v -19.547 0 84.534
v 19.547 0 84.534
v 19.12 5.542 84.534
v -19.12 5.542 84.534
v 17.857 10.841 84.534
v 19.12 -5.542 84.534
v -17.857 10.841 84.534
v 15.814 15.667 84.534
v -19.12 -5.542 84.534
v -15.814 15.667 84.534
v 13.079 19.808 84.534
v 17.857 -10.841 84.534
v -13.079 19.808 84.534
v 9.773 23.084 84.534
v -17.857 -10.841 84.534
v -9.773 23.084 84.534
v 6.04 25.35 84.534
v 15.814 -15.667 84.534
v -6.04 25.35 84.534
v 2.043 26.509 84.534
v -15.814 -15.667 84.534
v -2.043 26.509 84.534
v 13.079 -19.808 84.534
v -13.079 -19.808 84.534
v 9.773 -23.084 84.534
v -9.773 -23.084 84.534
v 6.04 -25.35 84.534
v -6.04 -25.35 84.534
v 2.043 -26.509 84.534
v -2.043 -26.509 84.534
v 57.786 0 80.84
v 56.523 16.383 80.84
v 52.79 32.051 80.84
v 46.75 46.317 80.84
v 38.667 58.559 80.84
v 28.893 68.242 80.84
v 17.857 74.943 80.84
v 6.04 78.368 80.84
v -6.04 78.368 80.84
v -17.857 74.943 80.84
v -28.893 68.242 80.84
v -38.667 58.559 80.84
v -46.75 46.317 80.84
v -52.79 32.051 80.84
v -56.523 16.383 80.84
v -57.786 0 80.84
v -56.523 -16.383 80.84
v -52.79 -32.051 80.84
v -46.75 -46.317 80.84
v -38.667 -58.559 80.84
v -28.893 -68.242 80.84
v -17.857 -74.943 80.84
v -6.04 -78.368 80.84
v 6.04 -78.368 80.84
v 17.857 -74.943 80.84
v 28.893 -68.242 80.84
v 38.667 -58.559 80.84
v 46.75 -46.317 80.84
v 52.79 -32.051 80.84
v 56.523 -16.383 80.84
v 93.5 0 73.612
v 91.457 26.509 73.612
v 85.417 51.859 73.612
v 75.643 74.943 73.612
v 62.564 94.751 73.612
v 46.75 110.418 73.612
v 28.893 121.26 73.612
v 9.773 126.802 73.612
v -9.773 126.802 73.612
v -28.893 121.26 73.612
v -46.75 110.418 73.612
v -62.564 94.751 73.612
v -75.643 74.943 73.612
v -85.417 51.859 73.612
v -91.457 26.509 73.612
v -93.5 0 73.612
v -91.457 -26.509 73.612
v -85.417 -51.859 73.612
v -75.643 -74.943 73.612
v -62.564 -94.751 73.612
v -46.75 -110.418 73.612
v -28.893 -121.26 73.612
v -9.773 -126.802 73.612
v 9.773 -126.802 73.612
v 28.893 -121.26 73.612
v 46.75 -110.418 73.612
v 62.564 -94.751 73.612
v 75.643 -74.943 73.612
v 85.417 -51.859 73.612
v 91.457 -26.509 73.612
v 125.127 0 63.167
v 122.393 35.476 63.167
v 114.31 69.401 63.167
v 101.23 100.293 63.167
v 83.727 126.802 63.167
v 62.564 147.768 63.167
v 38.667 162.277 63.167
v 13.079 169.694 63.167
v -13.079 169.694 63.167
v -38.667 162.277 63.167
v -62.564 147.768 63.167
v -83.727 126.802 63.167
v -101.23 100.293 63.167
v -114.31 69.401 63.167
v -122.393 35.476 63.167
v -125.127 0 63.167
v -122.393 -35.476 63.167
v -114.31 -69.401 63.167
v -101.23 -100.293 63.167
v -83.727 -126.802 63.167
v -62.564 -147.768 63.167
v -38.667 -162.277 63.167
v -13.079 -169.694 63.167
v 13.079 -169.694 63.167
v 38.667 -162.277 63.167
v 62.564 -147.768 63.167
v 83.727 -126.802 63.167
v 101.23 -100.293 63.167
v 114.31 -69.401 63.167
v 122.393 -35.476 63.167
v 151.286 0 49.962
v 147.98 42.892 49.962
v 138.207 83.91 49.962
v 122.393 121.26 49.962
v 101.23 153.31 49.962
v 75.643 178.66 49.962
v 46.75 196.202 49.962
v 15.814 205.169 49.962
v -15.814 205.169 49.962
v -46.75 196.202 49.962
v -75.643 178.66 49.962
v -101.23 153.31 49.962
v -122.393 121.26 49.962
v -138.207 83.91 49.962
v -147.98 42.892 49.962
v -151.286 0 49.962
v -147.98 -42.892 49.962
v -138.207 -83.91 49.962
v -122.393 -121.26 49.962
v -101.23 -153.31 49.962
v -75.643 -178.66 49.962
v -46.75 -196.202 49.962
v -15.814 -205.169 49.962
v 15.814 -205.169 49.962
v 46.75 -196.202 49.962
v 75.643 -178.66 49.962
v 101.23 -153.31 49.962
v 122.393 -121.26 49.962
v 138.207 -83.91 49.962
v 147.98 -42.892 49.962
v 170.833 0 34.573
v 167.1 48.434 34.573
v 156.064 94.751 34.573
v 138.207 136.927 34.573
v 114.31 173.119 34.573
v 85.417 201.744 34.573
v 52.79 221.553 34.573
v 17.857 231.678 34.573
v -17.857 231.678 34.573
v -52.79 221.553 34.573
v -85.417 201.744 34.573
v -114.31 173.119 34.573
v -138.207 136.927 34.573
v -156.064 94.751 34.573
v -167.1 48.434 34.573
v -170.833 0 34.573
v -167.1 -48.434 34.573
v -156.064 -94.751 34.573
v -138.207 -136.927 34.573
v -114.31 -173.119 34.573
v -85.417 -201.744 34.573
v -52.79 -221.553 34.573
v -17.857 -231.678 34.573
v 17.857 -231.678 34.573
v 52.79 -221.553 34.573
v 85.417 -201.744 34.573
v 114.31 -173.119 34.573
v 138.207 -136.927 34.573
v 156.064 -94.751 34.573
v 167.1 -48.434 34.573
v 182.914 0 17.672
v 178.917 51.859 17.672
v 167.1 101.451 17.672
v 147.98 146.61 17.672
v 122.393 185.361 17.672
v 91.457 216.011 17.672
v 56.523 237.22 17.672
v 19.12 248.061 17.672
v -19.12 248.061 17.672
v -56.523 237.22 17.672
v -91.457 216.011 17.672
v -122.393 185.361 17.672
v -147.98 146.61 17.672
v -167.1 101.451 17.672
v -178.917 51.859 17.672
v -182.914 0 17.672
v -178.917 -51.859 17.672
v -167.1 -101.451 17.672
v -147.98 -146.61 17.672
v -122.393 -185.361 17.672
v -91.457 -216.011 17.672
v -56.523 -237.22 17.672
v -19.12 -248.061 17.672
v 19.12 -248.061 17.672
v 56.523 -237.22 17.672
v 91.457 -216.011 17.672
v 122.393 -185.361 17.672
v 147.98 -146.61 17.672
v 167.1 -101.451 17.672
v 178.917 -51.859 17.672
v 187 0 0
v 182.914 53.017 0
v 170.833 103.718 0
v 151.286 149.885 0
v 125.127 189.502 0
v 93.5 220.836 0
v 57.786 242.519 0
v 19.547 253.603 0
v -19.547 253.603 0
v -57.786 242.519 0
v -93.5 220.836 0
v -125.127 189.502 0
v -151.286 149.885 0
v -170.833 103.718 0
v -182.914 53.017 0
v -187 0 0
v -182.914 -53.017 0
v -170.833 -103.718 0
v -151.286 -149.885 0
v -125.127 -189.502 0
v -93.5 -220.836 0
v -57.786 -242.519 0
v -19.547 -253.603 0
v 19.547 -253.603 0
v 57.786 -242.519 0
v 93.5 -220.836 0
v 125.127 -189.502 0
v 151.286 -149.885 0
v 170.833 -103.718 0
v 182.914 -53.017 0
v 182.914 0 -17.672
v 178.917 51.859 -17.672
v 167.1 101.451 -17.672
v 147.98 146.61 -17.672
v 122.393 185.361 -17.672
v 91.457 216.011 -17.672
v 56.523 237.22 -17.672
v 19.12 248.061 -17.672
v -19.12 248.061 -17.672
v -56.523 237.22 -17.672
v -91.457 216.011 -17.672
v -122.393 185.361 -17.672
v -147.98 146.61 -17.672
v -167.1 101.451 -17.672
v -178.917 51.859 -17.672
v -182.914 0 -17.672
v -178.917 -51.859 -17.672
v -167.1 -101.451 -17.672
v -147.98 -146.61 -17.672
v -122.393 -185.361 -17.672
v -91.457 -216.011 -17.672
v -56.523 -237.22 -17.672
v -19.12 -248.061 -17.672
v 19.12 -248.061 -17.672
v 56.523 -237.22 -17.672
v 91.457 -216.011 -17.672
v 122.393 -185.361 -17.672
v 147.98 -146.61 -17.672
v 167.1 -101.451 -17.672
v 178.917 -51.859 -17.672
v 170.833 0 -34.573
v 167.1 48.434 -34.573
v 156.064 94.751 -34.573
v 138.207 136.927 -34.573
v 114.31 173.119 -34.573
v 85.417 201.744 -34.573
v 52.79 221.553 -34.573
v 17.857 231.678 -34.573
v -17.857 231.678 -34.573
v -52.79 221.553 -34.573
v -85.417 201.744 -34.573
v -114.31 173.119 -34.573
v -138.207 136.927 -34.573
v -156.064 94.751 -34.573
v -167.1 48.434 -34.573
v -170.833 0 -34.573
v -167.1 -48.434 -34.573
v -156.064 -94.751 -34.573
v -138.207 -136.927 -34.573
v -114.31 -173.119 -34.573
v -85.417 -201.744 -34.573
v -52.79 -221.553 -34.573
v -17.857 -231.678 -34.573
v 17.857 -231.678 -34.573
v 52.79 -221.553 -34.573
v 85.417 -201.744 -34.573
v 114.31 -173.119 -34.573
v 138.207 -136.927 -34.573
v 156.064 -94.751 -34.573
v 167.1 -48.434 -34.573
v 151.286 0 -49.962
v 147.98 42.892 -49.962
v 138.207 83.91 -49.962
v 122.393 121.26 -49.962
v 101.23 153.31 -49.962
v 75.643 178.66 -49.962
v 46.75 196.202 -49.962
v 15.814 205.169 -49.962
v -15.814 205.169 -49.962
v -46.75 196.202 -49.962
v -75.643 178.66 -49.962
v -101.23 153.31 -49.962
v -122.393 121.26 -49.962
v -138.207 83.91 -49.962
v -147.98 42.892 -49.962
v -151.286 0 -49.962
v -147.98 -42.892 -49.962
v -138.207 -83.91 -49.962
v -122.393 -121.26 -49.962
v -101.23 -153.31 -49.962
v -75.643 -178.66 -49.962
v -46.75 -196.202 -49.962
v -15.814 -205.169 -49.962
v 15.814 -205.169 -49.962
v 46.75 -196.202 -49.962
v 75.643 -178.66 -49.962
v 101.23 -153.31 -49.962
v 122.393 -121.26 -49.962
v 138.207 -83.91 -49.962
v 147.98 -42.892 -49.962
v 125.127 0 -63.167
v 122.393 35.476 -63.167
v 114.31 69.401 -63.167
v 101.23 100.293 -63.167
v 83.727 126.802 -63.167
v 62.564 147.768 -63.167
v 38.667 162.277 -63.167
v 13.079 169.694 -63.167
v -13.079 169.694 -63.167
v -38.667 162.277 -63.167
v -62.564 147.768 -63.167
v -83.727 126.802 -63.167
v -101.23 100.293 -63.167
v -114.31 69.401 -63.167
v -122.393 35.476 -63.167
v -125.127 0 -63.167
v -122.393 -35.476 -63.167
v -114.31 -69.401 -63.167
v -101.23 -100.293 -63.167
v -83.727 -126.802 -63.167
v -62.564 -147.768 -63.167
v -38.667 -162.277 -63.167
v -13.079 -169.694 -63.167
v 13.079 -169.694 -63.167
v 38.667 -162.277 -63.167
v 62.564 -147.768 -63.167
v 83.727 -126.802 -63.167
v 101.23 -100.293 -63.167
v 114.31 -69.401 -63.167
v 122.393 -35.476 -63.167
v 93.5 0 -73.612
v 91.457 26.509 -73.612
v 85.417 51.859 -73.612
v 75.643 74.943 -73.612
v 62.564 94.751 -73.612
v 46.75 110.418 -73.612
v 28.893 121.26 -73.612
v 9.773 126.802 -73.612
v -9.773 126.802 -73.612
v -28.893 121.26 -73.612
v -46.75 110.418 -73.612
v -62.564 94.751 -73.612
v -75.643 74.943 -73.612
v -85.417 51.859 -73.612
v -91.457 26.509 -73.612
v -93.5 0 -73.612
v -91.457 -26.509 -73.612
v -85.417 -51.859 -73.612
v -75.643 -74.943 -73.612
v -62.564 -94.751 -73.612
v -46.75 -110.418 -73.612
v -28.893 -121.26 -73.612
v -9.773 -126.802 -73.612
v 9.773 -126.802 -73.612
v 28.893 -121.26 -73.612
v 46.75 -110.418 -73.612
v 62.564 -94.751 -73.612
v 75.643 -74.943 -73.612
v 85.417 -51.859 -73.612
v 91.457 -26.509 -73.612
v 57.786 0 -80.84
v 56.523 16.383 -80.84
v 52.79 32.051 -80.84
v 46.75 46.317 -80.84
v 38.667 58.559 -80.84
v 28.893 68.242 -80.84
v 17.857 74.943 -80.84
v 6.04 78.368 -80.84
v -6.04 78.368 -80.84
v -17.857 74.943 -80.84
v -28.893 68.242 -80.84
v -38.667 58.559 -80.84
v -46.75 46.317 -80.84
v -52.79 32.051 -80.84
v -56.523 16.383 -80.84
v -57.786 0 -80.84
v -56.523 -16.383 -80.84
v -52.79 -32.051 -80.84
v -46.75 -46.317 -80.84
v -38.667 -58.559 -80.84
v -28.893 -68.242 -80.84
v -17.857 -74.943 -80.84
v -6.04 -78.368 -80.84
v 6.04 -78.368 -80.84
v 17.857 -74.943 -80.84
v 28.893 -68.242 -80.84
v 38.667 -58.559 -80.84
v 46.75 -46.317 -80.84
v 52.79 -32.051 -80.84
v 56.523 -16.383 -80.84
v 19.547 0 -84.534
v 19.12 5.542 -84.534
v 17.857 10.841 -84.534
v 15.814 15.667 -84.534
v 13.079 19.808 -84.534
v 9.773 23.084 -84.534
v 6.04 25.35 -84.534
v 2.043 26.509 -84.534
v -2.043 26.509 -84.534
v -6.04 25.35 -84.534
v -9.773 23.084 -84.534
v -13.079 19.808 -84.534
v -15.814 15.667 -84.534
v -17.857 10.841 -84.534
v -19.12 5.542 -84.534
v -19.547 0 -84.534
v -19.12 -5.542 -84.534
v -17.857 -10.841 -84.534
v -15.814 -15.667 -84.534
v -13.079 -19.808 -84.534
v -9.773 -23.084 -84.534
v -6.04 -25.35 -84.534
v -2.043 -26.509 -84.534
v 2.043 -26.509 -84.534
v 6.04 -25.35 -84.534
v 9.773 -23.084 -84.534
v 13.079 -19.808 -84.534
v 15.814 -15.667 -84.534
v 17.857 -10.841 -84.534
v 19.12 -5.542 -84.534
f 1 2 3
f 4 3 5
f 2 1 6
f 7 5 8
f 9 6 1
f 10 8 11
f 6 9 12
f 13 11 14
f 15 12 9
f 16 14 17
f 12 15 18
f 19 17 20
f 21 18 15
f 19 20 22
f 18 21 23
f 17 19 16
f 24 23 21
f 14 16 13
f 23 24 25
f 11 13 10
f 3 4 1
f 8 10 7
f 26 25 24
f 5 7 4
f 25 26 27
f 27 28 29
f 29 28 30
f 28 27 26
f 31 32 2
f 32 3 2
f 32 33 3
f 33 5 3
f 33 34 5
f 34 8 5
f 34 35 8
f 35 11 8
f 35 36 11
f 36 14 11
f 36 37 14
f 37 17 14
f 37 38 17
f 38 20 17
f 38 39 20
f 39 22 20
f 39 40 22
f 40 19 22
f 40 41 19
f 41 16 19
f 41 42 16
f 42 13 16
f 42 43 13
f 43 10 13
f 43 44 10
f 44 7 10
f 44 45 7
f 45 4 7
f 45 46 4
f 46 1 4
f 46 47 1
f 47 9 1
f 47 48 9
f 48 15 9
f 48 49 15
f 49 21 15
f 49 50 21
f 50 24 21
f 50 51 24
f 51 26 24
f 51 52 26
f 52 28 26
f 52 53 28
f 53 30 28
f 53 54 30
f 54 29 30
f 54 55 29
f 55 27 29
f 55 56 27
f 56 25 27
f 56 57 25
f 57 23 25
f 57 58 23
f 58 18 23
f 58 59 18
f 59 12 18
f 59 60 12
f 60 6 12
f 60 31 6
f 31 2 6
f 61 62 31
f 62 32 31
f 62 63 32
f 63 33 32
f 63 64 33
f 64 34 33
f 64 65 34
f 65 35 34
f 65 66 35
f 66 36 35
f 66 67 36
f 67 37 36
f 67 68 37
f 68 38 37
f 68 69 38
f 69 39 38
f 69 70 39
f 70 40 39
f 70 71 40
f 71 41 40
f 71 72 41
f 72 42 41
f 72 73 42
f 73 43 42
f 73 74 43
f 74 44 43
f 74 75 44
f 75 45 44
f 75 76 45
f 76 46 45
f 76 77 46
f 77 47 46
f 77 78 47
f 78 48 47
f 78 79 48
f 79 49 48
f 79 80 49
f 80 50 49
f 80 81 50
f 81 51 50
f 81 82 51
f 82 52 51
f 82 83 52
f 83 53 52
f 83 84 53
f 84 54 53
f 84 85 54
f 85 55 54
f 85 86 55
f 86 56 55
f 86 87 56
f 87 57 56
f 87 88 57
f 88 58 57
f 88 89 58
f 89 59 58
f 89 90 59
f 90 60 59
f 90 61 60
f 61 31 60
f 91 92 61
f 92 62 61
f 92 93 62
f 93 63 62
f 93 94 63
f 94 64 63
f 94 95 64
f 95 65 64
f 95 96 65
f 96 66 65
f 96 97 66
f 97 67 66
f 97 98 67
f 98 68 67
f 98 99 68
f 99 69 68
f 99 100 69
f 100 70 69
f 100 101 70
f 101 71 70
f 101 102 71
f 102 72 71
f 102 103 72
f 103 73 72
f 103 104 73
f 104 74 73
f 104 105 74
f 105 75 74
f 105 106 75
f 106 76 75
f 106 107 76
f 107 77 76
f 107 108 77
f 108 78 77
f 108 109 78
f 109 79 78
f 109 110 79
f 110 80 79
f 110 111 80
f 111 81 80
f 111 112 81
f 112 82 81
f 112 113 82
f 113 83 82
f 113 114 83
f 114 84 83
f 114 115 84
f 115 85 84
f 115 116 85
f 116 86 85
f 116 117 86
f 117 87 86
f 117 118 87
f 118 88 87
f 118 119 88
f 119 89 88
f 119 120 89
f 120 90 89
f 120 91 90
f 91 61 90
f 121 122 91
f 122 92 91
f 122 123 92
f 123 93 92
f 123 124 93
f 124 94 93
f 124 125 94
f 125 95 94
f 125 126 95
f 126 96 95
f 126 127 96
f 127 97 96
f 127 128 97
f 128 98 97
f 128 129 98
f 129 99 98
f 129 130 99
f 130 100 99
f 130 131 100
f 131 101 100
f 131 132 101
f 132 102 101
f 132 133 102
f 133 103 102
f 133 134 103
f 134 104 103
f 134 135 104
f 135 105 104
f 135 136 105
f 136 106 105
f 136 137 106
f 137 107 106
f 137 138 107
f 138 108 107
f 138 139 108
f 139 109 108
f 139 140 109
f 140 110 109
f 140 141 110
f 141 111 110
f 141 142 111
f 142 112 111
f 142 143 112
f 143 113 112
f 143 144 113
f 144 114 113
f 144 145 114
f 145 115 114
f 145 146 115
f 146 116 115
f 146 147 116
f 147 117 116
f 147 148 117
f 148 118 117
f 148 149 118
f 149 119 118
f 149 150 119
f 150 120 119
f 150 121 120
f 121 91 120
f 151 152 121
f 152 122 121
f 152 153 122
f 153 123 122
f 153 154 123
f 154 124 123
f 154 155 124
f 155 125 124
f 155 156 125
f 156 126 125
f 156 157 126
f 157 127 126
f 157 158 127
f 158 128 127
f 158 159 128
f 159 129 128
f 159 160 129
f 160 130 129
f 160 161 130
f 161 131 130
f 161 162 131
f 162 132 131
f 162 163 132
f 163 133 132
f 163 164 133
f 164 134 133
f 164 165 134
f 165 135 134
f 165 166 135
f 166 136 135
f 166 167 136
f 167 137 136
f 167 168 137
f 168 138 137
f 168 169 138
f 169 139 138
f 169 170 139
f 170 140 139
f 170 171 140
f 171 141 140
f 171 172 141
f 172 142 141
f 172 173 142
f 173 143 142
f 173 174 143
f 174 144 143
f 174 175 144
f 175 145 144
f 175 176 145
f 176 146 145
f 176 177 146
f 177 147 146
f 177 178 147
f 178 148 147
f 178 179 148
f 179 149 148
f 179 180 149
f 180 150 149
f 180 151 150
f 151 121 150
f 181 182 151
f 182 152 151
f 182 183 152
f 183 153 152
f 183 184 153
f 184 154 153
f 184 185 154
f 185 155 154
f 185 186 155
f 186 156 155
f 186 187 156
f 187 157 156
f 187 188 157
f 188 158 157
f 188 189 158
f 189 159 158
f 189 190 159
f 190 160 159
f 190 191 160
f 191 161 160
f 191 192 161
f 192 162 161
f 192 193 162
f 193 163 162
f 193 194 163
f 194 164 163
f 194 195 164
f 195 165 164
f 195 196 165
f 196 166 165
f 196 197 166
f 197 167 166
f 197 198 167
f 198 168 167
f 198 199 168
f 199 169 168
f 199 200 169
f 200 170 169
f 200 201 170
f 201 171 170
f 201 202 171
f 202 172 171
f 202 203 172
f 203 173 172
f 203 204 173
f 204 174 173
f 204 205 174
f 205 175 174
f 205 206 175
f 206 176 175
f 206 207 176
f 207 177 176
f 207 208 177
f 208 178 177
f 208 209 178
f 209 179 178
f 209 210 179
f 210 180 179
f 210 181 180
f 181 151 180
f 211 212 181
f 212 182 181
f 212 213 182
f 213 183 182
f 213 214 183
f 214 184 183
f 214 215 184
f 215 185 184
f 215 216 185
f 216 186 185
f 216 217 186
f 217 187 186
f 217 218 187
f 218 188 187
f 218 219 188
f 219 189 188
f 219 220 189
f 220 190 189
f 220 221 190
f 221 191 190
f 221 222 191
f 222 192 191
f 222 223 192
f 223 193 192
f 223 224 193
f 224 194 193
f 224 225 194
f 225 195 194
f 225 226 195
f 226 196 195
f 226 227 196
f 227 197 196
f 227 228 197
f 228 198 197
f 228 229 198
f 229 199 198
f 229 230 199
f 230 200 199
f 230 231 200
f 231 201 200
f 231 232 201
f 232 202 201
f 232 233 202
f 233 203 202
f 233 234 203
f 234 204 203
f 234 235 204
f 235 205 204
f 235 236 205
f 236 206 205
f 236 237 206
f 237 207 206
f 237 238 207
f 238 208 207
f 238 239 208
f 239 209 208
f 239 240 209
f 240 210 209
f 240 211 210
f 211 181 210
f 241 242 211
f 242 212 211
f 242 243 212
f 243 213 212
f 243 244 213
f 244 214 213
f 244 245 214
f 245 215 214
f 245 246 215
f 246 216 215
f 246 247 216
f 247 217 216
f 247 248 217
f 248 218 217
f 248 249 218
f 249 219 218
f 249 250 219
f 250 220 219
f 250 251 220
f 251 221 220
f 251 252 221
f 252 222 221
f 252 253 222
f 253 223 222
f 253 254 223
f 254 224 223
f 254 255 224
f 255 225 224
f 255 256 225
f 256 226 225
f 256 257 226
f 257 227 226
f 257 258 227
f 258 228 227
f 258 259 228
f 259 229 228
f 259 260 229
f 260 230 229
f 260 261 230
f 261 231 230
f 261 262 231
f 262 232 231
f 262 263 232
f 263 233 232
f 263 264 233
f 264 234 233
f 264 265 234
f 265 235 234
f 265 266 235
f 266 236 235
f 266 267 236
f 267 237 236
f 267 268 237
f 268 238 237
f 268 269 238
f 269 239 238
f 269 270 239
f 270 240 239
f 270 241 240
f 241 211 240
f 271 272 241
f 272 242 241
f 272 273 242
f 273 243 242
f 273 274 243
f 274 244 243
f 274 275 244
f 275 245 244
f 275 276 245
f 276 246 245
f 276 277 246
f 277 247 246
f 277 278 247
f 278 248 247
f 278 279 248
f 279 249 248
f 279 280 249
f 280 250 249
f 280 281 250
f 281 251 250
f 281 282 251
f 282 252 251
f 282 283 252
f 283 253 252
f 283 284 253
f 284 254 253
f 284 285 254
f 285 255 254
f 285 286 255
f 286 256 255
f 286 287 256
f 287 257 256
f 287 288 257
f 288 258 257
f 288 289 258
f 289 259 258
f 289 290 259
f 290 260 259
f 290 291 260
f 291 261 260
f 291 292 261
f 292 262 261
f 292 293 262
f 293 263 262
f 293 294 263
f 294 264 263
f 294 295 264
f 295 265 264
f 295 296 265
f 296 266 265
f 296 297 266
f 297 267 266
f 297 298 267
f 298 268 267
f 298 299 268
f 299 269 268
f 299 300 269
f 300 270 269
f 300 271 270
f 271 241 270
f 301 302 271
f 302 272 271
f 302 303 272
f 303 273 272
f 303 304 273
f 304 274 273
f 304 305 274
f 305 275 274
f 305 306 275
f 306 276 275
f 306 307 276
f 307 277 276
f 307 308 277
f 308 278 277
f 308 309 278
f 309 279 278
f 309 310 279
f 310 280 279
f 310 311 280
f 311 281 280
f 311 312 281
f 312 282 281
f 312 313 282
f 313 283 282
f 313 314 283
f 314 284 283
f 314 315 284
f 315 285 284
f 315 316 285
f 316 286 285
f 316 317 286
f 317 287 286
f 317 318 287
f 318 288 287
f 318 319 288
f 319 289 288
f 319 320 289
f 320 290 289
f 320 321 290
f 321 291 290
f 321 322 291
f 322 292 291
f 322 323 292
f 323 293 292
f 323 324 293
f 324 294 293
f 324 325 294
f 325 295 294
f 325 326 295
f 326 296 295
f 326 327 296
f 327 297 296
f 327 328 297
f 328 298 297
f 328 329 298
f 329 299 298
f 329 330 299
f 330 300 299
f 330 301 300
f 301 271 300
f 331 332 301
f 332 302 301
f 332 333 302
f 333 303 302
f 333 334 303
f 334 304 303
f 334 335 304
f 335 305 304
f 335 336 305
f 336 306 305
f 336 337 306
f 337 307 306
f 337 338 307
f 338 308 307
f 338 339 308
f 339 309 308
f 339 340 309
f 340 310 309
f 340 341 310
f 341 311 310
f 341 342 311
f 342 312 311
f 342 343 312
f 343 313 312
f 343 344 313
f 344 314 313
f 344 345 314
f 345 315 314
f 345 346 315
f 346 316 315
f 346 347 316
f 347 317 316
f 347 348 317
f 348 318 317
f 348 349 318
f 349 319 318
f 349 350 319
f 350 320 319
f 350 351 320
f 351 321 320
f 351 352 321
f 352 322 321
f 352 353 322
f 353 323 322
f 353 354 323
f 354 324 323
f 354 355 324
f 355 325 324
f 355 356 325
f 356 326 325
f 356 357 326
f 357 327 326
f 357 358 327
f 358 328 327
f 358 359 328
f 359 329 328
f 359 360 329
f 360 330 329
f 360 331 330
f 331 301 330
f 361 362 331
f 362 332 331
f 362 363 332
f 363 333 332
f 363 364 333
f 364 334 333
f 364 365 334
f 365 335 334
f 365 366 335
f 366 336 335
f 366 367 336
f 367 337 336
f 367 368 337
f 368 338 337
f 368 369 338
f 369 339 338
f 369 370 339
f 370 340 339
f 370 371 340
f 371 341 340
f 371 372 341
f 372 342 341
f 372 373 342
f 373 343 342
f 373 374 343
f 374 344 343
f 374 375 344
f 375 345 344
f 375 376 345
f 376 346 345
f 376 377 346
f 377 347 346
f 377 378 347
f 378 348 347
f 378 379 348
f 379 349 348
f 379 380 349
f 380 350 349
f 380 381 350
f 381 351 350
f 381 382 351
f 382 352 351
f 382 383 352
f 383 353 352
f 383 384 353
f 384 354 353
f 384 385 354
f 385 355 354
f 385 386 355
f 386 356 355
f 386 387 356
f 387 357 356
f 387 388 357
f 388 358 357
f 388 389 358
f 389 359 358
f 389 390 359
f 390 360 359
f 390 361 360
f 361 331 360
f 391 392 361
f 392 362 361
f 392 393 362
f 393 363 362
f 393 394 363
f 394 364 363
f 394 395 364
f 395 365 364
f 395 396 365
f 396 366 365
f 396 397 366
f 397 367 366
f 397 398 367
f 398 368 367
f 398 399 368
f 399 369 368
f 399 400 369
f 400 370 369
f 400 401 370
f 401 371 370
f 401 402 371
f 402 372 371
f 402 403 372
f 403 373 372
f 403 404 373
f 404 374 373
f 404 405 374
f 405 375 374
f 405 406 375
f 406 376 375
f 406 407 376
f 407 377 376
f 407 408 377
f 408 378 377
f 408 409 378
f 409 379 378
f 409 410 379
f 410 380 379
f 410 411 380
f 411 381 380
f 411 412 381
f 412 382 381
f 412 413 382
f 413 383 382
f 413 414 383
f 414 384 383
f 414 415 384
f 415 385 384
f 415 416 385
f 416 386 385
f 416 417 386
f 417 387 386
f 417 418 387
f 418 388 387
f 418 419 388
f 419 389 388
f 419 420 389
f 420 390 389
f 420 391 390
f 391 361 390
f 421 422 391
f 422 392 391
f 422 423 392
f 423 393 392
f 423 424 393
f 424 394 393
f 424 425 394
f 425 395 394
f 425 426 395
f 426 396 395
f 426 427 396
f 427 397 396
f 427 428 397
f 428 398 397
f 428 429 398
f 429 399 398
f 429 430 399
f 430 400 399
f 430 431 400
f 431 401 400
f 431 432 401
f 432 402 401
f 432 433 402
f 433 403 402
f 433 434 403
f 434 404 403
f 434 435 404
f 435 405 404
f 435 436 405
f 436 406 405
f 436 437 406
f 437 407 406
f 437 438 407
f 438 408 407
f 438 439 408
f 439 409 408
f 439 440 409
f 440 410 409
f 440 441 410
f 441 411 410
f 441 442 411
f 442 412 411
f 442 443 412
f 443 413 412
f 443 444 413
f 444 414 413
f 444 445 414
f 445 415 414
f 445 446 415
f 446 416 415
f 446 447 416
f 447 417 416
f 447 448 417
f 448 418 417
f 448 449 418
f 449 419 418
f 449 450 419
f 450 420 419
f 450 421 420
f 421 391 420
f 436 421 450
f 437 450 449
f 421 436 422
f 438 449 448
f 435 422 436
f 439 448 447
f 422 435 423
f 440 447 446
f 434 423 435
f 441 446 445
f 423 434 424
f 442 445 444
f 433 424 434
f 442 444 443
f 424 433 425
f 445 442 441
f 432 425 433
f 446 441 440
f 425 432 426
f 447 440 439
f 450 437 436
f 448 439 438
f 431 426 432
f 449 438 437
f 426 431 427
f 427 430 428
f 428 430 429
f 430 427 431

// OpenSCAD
// Generated by SolidPython 1.0.1 on 2020-07-29 00:46:50


scale(v = [11, 15, 5]) {
	sphere(r = 17);
}
/***********************************************
*********      SolidPython code:      **********
************************************************
 
# import packages: SolidPython
from solid import *
from solid.utils import *
from itertools import chain, combinations, permutations


class Resize:

    def __init__(self, scad_file):
        self.scad_file = scad_file
        #self.scad_file = import_scad(scad_file)
        # cone/cylinder param:
        self.r1 = 0
        self.r2 = 0
        self.h = 0
        # rectangular prism param:
        self.w = 0
        self.l = 0
        # ellipse param:
        self.r = 0

    # import OpenScad code (file name corresponds to shape)


    # classify shape + parameters
    def assign(self, param1, param2, param3):
        if self.scad_file == 'cone.scad':
            self.r1 = param1
            self.r2 = param2
            self.h = param3
        elif self.scad_file == 'cylinder.scad':
            self.r1 = param1
            self.r2 = param2
            self.h = param3
        elif self.scad_file == 'rectangularPrism.scad':
            self.h = param1
            self.l = param2
            self.w = param3
        else:
            self.r = param1
            self.h = param2

    # resize parameters
    def iterate(self):
        x = range(3, 20, 2)
        i = 1
        if self.scad_file == 'cone.scad':
            tempList = list(permutations(x, 2))
            for temp in tempList:
                param1 = temp[0]
                param2 = temp[1]
                filepath = 'produced_scad_files/' + 'cone' + str(param1) + '_' + str(param2) + '_' + '.scad'
                scad_render_to_file(cylinder(h=param1, r1=param2, r2=0), filepath)

        elif self.scad_file == 'cylinder.scad':
            tempList = list(permutations(x, 3))
            for temp in tempList:
                param1 = temp[0]
                param2 = temp[1]
                filepath = 'produced_scad_files/' + 'cylinder' + str(param1) + '_' + str(param2) + '_' + '.scad'
                scad_render_to_file(cylinder(h=param1, r1=param2, r2=param2), filepath)

        elif self.scad_file == 'rectangularPrism.scad':
            tempList = list(permutations(x, 3))
            for temp in tempList:
                param1 = temp[0]
                param2 = temp[1]
                param3 = temp[2]
                filepath = 'produced_scad_files/' + 'rectangularPrism' + str(param1) + '_' + str(param2) + '_' + str(
                    param3) + '.scad'
                scad_render_to_file(cube(size=(param1, param2, param3)), filepath)

        elif self.scad_file == 'ellipse.scad':
            tempList = list(permutations(x, 4))
            for temp in tempList:
                param1 = temp[0]
                param2 = temp[1]
                param3 = temp[2]
                param4 = temp[3]
                filepath = 'produced_scad_files/' + 'ellipse' + str(param1) + '_' + str(param2) + '_' + str(param3) + '_' + str(param4) + '.scad'
                scad_render_to_file(scale([param1, param2, param3])(sphere(r=param4)), filepath)

    def render_to_scadfile(self):
        scad_render_to_file(scad, 'example.scad') 
 
************************************************/
